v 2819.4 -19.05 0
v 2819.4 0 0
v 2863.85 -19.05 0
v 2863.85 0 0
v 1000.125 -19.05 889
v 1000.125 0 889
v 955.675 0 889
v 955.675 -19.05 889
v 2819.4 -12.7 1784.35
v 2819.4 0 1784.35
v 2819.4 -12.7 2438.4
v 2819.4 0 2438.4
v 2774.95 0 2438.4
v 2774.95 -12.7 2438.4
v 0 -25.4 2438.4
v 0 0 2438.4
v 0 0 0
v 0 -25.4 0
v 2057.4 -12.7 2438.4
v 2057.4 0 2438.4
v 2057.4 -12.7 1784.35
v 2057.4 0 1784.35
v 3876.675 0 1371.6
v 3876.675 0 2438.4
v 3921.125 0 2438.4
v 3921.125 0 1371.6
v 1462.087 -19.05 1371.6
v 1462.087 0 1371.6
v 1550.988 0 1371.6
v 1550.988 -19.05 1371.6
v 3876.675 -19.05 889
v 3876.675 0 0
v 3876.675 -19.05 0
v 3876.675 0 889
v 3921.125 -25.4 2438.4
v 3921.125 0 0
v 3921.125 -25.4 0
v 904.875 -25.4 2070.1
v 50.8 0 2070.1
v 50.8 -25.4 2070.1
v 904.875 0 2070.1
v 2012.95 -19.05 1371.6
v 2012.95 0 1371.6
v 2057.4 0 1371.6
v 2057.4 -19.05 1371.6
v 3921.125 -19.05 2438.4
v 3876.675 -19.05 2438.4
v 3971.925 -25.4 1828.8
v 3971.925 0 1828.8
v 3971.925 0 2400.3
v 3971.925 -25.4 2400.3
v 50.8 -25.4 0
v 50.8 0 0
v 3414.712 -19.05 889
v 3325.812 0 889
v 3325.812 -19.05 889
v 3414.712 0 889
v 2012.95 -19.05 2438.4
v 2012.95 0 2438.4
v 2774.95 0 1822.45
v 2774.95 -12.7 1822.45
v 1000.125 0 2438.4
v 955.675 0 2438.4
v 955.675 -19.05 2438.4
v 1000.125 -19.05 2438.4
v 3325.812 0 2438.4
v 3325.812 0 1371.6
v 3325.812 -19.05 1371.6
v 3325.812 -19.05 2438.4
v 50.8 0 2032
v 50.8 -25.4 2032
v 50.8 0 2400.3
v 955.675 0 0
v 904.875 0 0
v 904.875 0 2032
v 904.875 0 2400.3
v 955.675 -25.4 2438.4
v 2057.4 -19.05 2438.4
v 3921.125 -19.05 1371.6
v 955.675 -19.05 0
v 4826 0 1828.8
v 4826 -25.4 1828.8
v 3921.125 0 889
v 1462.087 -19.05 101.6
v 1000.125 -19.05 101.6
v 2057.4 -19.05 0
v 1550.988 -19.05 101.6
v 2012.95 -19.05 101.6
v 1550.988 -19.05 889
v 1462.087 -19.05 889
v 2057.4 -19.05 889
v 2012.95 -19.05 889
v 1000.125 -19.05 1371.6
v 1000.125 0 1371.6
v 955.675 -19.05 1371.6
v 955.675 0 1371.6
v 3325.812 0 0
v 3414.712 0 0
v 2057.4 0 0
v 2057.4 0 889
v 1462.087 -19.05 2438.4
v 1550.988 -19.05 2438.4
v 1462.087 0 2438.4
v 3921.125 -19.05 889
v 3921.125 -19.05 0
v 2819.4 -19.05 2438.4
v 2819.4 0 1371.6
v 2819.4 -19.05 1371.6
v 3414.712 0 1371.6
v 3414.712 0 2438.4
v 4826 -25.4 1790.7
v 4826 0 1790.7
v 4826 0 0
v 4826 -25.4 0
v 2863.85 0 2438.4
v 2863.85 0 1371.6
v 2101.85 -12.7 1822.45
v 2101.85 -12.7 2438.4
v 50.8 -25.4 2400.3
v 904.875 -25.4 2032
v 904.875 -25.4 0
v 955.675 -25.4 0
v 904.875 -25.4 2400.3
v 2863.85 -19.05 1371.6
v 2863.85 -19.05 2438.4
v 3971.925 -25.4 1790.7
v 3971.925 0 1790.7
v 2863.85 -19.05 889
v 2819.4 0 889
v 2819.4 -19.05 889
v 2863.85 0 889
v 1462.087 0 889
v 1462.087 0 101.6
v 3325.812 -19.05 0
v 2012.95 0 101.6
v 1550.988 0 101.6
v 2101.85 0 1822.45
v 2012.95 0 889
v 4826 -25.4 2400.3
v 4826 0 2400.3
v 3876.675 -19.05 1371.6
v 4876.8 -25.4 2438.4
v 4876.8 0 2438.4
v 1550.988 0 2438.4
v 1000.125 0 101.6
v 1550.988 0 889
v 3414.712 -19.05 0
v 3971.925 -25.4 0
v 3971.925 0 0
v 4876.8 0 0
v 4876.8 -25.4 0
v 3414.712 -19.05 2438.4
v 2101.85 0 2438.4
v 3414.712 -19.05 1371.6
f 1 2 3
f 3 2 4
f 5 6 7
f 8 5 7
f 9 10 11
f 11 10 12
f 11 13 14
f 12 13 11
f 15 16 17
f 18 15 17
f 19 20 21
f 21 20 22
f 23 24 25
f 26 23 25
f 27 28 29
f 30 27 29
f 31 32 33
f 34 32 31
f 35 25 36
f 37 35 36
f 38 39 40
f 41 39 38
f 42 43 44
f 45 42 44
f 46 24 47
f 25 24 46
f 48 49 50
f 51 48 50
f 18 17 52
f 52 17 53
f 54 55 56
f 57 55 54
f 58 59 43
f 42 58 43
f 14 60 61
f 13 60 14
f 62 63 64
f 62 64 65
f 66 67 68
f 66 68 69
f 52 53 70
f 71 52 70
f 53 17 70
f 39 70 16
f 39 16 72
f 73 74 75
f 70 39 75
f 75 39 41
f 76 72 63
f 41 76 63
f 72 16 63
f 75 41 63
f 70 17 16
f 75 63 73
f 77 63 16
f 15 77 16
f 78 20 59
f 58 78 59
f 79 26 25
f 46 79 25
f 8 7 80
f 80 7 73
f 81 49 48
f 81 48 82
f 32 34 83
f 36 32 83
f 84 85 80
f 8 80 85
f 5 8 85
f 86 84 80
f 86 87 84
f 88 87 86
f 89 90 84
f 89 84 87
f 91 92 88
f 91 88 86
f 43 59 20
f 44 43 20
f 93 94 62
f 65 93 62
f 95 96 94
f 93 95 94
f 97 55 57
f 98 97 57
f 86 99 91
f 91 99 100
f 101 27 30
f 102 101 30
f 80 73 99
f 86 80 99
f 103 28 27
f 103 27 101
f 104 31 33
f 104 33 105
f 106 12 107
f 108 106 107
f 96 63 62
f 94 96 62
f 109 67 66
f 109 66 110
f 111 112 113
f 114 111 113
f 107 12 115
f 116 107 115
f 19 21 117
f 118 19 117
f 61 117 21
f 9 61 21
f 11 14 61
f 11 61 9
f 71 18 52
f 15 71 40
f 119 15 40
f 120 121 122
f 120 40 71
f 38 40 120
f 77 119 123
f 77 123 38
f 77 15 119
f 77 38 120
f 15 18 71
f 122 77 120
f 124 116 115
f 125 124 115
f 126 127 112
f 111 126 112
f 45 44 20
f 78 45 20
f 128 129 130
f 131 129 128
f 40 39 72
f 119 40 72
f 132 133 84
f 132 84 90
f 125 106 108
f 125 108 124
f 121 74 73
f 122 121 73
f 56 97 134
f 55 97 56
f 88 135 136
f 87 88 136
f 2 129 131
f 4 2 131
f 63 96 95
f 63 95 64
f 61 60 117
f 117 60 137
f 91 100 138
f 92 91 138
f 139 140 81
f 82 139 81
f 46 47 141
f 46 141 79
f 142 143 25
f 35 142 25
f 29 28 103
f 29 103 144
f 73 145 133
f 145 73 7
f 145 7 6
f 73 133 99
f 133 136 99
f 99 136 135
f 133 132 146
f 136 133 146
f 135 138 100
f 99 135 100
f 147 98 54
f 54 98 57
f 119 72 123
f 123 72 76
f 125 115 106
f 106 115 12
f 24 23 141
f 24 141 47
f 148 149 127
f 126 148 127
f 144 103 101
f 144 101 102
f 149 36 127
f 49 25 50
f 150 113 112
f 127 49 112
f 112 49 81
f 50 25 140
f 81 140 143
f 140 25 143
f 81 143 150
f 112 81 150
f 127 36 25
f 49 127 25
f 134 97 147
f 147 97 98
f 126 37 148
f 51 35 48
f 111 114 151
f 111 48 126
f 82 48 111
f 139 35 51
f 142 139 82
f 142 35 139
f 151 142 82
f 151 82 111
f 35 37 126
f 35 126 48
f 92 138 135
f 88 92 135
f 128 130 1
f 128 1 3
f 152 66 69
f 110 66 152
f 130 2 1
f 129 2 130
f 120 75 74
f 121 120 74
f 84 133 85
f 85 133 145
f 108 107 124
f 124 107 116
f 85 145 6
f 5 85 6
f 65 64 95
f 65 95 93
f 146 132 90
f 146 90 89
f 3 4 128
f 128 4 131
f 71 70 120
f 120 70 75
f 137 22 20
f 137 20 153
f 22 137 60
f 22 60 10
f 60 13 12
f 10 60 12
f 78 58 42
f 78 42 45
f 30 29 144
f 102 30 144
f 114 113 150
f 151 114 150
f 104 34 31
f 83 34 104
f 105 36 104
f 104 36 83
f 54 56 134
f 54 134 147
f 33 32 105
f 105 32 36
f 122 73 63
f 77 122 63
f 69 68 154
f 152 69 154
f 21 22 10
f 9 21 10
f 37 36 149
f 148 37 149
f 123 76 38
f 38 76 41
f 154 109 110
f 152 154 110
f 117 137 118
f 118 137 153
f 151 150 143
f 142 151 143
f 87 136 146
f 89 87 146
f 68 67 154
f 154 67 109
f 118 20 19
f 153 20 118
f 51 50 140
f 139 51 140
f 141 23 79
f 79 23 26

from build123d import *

# Parameters (mm, degrees)
F0_W     = 854.075
F0_H     = 38.1
F1_DEPTH = 25.4
F0_W_2   = 44.45
F0_H_2   = 1066.8
F2_DEPTH = 19.05
F0_W_3   = 88.9
F0_H_3   = 787.4
F0_H_4   = 889
F0_H_5   = 615.95
F3_DEPTH = 12.7


with BuildPart() as f1:
    # F0 (on Front) → F1 (new body)
    with BuildSketch(Plane.XZ):
        Polygon((0, 2438.4), (0, 0), (50.8, 0), (50.8, 2032), (50.8, 2070.1), (50.8, 2400.3), (50.8, 2438.4), align=None)
        with Locations((477.8375, 2051.05)):
            Rectangle(F0_W, F0_H)
        with Locations((477.8375, 2419.35)):
            Rectangle(F0_W, F0_H)
        Polygon((904.875, 2032), (904.875, 0), (955.675, 0), (955.675, 889), (955.675, 1371.6), (955.675, 2438.4), (904.875, 2438.4), (904.875, 2400.3), (904.875, 2070.1), align=None)
    extrude(amount=F1_DEPTH)


with BuildPart() as f1b:
    # F0 (on Front) → F1, piece 2 (new body)
    with BuildSketch(Plane.XZ):
        Polygon((3921.125, 889), (3921.125, 0), (3971.925, 0), (3971.925, 1790.7), (3971.925, 1828.8), (3971.925, 2400.3), (3971.925, 2438.4), (3921.125, 2438.4), (3921.125, 1371.6), align=None)
        with Locations((4398.9625, 1809.75)):
            Rectangle(F0_W, F0_H)
        with Locations((4398.9625, 2419.35)):
            Rectangle(F0_W, F0_H)
        Polygon((4826, 1790.7), (4826, 0), (4876.8, 0), (4876.8, 2438.4), (4826, 2438.4), (4826, 2400.3), (4826, 1828.8), align=None)
    extrude(amount=F1_DEPTH)


with BuildPart() as f2:
    # F0 (on Front) → F2 (new body)
    with BuildSketch(Plane.XZ):
        with Locations((977.9, 1905)):
            Rectangle(F0_W_2, F0_H_2)
    extrude(amount=F2_DEPTH)


with BuildPart() as f2b:
    # F0 (on Front) → F2, piece 2 (new body)
    with BuildSketch(Plane.XZ):
        with Locations((1506.5375, 1905)):
            Rectangle(F0_W_3, F0_H_2)
    extrude(amount=F2_DEPTH)


with BuildPart() as f2c:
    # F0 (on Front) → F2, piece 3 (new body)
    with BuildSketch(Plane.XZ):
        Polygon((2057.4, 2438.4), (2012.95, 2438.4), (2012.95, 1371.6), (2057.4, 1371.6), (2057.4, 1784.35), (2057.4, 1822.45), align=None)
    extrude(amount=F2_DEPTH)


with BuildPart() as f2d:
    # F0 (on Front) → F2, piece 4 (new body)
    with BuildSketch(Plane.XZ):
        Polygon((2863.85, 2438.4), (2819.4, 2438.4), (2819.4, 1822.45), (2819.4, 1784.35), (2819.4, 1371.6), (2863.85, 1371.6), align=None)
    extrude(amount=F2_DEPTH)


with BuildPart() as f2e:
    # F0 (on Front) → F2, piece 5 (new body)
    with BuildSketch(Plane.XZ):
        with Locations((3370.2625, 1905)):
            Rectangle(F0_W_3, F0_H_2)
    extrude(amount=F2_DEPTH)


with BuildPart() as f2f:
    # F0 (on Front) → F2, piece 6 (new body)
    with BuildSketch(Plane.XZ):
        with Locations((3898.9, 1905)):
            Rectangle(F0_W_2, F0_H_2)
    extrude(amount=F2_DEPTH)


with BuildPart() as f2g:
    # F0 (on Front) → F2, piece 7 (new body)
    with BuildSketch(Plane.XZ):
        Polygon((955.675, 889), (955.675, 0), (2012.95, 0), (2012.95, 101.6), (1550.9875, 101.6), (1462.0875, 101.6), (1000.125, 101.6), (1000.125, 889), align=None)
        with Locations((1506.5375, 495.3)):
            Rectangle(F0_W_3, F0_H_3)
        Polygon((2012.95, 101.6), (2012.95, 0), (2057.4, 0), (2057.4, 889), (2012.95, 889), align=None)
    extrude(amount=F2_DEPTH)


with BuildPart() as f2h:
    # F0 (on Front) → F2, piece 8 (new body)
    with BuildSketch(Plane.XZ):
        with Locations((2841.625, 444.5)):
            Rectangle(F0_W_2, F0_H_4)
    extrude(amount=F2_DEPTH)


with BuildPart() as f2i:
    # F0 (on Front) → F2, piece 9 (new body)
    with BuildSketch(Plane.XZ):
        with Locations((3370.2625, 444.5)):
            Rectangle(F0_W_3, F0_H_4)
    extrude(amount=F2_DEPTH)


with BuildPart() as f2j:
    # F0 (on Front) → F2, piece 10 (new body)
    with BuildSketch(Plane.XZ):
        with Locations((3898.9, 444.5)):
            Rectangle(F0_W_2, F0_H_4)
    extrude(amount=F2_DEPTH)


with BuildPart() as f3:
    # F0 (on Front) → F3 (new body)
    with BuildSketch(Plane.XZ):
        with Locations((2079.625, 2130.425)):
            Rectangle(F0_W_2, F0_H_5)
        Polygon((2101.85, 1822.45), (2057.4, 1822.45), (2057.4, 1784.35), (2819.4, 1784.35), (2819.4, 1822.45), (2774.95, 1822.45), align=None)
        with Locations((2797.175, 2130.425)):
            Rectangle(F0_W_2, F0_H_5)
    extrude(amount=F3_DEPTH)


solid = Compound([f1.part, f1b.part, f2.part, f2b.part, f2c.part, f2d.part, f2e.part, f2f.part, f2g.part, f2h.part, f2i.part, f2j.part, f3.part])
